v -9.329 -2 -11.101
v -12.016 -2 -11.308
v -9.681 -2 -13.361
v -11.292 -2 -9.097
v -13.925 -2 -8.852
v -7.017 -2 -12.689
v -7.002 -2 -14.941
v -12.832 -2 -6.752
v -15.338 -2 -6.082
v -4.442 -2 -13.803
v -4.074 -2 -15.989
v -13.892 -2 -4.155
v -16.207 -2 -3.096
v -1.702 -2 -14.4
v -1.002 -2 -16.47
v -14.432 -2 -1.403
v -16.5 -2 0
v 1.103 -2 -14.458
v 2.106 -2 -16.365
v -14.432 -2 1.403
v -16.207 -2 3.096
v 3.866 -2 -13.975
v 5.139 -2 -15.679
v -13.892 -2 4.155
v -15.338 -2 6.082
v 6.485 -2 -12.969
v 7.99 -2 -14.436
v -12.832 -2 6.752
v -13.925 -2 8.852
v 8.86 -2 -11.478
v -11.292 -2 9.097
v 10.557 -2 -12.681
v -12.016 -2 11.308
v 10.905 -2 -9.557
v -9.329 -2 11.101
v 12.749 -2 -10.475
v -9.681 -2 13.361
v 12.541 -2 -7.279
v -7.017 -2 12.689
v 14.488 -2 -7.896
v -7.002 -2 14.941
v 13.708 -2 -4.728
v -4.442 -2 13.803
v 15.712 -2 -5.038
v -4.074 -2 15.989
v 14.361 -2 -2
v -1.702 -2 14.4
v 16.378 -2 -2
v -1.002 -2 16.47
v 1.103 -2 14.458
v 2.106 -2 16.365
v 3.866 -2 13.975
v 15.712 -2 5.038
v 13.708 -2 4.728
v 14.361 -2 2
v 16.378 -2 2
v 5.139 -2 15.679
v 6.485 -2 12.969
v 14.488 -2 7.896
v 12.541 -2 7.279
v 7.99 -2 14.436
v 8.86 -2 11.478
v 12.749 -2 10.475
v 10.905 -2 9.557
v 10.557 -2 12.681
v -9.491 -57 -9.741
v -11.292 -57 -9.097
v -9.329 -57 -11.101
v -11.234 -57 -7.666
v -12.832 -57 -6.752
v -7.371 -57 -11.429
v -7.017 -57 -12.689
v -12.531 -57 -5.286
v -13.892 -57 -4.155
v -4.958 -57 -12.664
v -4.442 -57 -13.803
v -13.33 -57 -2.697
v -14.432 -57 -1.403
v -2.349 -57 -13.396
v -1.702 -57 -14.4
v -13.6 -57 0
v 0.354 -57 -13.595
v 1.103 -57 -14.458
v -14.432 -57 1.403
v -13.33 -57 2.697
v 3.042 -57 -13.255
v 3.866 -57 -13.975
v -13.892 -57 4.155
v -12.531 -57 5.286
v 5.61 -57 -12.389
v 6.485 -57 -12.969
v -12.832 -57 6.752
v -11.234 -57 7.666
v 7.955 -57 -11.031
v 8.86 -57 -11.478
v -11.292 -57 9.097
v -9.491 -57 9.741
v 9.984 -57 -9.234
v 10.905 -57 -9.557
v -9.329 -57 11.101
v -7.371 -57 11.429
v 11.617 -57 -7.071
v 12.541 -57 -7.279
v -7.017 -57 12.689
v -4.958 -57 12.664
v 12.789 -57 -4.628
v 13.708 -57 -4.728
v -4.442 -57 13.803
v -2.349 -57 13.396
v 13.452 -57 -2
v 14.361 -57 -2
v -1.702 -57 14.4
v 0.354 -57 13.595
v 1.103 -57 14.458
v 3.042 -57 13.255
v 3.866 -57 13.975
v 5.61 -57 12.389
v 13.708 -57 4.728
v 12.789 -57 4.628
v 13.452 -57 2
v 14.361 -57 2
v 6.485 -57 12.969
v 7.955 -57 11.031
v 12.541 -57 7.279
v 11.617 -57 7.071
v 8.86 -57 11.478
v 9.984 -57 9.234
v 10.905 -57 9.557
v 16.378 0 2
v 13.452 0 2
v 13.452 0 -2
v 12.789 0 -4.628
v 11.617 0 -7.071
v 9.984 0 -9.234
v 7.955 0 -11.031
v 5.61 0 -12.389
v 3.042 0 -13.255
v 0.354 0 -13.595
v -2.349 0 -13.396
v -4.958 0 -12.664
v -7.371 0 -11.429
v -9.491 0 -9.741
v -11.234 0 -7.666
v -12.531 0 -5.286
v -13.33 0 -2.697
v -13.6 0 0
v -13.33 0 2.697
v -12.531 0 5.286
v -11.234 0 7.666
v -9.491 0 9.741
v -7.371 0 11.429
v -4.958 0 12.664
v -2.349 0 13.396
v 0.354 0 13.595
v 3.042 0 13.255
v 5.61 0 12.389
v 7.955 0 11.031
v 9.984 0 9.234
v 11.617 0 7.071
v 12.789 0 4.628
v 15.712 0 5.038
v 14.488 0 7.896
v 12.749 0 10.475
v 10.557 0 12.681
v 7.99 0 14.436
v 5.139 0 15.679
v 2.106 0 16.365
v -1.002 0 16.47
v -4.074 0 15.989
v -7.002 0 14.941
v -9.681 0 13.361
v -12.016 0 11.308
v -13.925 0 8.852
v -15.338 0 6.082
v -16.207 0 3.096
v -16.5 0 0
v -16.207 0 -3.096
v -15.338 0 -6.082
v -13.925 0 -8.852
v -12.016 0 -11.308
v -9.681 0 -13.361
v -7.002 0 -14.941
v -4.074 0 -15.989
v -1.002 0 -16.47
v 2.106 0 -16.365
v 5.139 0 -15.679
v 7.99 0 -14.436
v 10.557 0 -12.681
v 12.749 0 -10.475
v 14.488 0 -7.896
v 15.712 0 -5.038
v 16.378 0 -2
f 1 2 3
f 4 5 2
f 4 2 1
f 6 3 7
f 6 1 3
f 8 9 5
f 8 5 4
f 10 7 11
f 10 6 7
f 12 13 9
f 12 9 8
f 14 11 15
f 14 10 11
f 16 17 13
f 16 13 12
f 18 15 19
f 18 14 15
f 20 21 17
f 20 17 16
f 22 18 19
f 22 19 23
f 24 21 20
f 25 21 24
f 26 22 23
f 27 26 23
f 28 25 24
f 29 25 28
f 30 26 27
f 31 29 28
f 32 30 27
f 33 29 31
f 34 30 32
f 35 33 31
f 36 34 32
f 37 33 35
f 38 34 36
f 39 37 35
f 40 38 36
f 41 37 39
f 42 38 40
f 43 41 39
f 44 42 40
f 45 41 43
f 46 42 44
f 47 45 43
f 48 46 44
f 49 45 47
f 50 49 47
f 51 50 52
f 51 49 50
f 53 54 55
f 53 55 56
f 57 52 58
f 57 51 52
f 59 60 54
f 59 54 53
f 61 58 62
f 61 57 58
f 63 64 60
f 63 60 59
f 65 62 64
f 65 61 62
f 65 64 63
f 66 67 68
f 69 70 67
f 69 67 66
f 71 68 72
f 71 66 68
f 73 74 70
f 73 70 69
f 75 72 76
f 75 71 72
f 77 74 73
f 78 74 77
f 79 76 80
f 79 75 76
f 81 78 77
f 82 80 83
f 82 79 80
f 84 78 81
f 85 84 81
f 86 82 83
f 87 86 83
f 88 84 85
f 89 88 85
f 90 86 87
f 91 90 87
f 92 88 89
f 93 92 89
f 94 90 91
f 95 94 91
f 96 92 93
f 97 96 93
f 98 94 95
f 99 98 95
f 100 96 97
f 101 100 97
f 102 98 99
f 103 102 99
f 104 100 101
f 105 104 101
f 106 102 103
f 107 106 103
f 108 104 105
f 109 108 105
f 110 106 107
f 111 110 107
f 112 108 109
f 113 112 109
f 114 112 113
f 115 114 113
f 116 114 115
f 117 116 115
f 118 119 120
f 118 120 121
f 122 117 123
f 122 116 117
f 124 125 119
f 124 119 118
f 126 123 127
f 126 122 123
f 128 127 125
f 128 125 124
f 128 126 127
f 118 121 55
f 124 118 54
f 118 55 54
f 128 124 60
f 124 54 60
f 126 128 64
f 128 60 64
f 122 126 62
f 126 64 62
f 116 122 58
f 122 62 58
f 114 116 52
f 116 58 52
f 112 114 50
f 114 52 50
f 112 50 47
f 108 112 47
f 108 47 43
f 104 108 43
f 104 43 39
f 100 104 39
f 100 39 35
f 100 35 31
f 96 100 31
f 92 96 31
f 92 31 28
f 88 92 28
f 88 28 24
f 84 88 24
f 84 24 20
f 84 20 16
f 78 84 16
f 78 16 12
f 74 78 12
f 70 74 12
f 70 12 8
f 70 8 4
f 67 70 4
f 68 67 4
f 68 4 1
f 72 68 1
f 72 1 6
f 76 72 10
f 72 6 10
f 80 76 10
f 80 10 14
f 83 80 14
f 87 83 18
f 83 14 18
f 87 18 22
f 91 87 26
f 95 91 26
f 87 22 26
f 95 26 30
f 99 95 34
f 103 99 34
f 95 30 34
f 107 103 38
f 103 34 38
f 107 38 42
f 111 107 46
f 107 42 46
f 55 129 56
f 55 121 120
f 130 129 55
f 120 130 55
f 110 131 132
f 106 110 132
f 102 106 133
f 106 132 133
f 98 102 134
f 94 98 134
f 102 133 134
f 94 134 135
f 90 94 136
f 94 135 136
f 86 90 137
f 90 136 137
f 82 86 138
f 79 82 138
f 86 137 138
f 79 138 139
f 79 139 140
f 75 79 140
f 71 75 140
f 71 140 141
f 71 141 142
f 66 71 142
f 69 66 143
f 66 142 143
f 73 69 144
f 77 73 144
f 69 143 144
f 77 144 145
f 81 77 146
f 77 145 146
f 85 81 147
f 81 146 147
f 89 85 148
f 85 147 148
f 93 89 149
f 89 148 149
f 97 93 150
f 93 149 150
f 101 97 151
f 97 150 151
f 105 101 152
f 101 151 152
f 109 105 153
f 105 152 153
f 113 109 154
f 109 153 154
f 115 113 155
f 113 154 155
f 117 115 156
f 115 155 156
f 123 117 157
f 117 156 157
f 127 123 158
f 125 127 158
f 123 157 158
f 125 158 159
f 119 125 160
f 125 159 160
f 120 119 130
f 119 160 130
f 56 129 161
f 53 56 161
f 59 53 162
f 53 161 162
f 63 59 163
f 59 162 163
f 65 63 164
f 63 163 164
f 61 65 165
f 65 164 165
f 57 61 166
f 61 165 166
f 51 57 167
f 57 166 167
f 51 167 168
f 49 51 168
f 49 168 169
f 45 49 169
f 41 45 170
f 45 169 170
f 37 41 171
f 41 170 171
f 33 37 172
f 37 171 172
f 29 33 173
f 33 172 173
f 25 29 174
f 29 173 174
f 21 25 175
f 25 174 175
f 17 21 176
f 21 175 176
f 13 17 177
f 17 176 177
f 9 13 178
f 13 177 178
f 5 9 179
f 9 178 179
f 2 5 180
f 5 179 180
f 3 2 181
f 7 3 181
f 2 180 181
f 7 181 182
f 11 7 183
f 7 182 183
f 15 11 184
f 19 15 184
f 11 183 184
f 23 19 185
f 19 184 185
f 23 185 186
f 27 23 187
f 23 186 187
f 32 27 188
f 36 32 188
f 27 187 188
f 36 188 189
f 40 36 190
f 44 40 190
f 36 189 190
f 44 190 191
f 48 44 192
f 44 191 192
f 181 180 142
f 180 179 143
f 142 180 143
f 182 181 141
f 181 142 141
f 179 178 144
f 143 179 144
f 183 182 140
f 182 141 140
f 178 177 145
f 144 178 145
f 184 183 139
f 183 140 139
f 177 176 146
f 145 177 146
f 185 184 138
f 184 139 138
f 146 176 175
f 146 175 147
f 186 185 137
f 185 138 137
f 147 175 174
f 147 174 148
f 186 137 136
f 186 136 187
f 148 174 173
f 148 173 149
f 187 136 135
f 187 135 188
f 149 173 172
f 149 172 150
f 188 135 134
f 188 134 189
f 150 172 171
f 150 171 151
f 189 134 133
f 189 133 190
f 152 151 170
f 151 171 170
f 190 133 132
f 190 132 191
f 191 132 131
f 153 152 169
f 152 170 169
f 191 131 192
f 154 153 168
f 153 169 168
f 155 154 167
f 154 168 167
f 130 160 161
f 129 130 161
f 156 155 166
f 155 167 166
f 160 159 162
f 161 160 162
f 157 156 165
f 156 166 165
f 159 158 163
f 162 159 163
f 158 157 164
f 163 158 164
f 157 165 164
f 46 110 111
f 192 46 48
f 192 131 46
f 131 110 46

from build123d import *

# Parameters (mm, degrees)
F1_DEPTH = 2
F2_DEPTH = 57
F3_DEPTH = 127


with BuildPart() as f1:
    # F0 (on Front) → F1 (new body)
    with BuildSketch(Plane.XZ):
        with BuildLine():
            ThreePointArc((14.3614066163, -2), (-14.5, 0), (14.3614066163, 2))
            Line((14.3614066163, 2), (16.3783393542, 2))
            ThreePointArc((16.3783393542, 2), (-16.5, 0), (16.3783393542, -2))
            Line((16.3783393542, -2), (14.3614066163, -2))
        make_face()
        with BuildLine():
            Line((16.3783393542, 2), (14.3614066163, 2))
            ThreePointArc((14.3614066163, 2), (14.465310158, 1.0023981402), (14.5, 0))
            ThreePointArc((14.5, 0), (14.465310158, -1.0023981402), (14.3614066163, -2))
            Line((14.3614066163, -2), (16.3783393542, -2))
            ThreePointArc((16.3783393542, -2), (16.469556754, -1.0018484557), (16.5, 0))
            ThreePointArc((16.5, 0), (16.469556754, 1.0018484557), (16.3783393542, 2))
        make_face()
    extrude(amount=F1_DEPTH)

    # F0 (on Front) → F2 (join)
    with BuildSketch(Plane.XZ):
        with BuildLine():
            ThreePointArc((13.4521373766, -2), (-13.6, 0), (13.4521373766, 2))
            Line((13.4521373766, 2), (14.3614066163, 2))
            ThreePointArc((14.3614066163, 2), (-14.5, 0), (14.3614066163, -2))
            Line((14.3614066163, -2), (13.4521373766, -2))
        make_face()
        with BuildLine():
            ThreePointArc((13.4521373766, 2), (13.5629839697, 1.0027291952), (13.6, 0))
            ThreePointArc((13.6, 0), (13.5629839697, -1.0027291952), (13.4521373766, -2))
            Line((13.4521373766, -2), (14.3614066163, -2))
            ThreePointArc((14.3614066163, -2), (14.465310158, -1.0023981402), (14.5, 0))
            ThreePointArc((14.5, 0), (14.465310158, 1.0023981402), (14.3614066163, 2))
            Line((14.3614066163, 2), (13.4521373766, 2))
        make_face()
    extrude(amount=F2_DEPTH)

    # F0 (on Front) → F3 (cut)
    with BuildSketch(Plane.XZ):
        with BuildLine():
            Line((19.9760421067, 2), (16.3783393542, 2))
            ThreePointArc((16.3783393542, 2), (16.469556754, 1.0018484557), (16.5, 0))
            ThreePointArc((16.5, 0), (16.469556754, -1.0018484557), (16.3783393542, -2))
            Line((16.3783393542, -2), (19.9760421067, -2))
            Line((19.9760421067, -2), (19.9760421067, 2))
        make_face()
        with BuildLine():
            Line((16.3783393542, 2), (14.3614066163, 2))
            ThreePointArc((14.3614066163, 2), (14.465310158, 1.0023981402), (14.5, 0))
            ThreePointArc((14.5, 0), (14.465310158, -1.0023981402), (14.3614066163, -2))
            Line((14.3614066163, -2), (16.3783393542, -2))
            ThreePointArc((16.3783393542, -2), (16.469556754, -1.0018484557), (16.5, 0))
            ThreePointArc((16.5, 0), (16.469556754, 1.0018484557), (16.3783393542, 2))
        make_face()
        with BuildLine():
            ThreePointArc((13.4521373766, 2), (13.5629839697, 1.0027291952), (13.6, 0))
            ThreePointArc((13.6, 0), (13.5629839697, -1.0027291952), (13.4521373766, -2))
            Line((13.4521373766, -2), (14.3614066163, -2))
            ThreePointArc((14.3614066163, -2), (14.465310158, -1.0023981402), (14.5, 0))
            ThreePointArc((14.5, 0), (14.465310158, 1.0023981402), (14.3614066163, 2))
            Line((14.3614066163, 2), (13.4521373766, 2))
        make_face()
        with BuildLine():
            ThreePointArc((13.4521373766, -2), (13.5629839697, -1.0027291952), (13.6, 0))
            ThreePointArc((13.6, 0), (13.5629839697, 1.0027291952), (13.4521373766, 2))
            Line((13.4521373766, 2), (7.9760421067, 2))
            Line((7.9760421067, 2), (7.9760421067, -2))
            Line((7.9760421067, -2), (13.4521373766, -2))
        make_face()
    extrude(amount=F3_DEPTH, mode=Mode.SUBTRACT)


solid = f1.part
